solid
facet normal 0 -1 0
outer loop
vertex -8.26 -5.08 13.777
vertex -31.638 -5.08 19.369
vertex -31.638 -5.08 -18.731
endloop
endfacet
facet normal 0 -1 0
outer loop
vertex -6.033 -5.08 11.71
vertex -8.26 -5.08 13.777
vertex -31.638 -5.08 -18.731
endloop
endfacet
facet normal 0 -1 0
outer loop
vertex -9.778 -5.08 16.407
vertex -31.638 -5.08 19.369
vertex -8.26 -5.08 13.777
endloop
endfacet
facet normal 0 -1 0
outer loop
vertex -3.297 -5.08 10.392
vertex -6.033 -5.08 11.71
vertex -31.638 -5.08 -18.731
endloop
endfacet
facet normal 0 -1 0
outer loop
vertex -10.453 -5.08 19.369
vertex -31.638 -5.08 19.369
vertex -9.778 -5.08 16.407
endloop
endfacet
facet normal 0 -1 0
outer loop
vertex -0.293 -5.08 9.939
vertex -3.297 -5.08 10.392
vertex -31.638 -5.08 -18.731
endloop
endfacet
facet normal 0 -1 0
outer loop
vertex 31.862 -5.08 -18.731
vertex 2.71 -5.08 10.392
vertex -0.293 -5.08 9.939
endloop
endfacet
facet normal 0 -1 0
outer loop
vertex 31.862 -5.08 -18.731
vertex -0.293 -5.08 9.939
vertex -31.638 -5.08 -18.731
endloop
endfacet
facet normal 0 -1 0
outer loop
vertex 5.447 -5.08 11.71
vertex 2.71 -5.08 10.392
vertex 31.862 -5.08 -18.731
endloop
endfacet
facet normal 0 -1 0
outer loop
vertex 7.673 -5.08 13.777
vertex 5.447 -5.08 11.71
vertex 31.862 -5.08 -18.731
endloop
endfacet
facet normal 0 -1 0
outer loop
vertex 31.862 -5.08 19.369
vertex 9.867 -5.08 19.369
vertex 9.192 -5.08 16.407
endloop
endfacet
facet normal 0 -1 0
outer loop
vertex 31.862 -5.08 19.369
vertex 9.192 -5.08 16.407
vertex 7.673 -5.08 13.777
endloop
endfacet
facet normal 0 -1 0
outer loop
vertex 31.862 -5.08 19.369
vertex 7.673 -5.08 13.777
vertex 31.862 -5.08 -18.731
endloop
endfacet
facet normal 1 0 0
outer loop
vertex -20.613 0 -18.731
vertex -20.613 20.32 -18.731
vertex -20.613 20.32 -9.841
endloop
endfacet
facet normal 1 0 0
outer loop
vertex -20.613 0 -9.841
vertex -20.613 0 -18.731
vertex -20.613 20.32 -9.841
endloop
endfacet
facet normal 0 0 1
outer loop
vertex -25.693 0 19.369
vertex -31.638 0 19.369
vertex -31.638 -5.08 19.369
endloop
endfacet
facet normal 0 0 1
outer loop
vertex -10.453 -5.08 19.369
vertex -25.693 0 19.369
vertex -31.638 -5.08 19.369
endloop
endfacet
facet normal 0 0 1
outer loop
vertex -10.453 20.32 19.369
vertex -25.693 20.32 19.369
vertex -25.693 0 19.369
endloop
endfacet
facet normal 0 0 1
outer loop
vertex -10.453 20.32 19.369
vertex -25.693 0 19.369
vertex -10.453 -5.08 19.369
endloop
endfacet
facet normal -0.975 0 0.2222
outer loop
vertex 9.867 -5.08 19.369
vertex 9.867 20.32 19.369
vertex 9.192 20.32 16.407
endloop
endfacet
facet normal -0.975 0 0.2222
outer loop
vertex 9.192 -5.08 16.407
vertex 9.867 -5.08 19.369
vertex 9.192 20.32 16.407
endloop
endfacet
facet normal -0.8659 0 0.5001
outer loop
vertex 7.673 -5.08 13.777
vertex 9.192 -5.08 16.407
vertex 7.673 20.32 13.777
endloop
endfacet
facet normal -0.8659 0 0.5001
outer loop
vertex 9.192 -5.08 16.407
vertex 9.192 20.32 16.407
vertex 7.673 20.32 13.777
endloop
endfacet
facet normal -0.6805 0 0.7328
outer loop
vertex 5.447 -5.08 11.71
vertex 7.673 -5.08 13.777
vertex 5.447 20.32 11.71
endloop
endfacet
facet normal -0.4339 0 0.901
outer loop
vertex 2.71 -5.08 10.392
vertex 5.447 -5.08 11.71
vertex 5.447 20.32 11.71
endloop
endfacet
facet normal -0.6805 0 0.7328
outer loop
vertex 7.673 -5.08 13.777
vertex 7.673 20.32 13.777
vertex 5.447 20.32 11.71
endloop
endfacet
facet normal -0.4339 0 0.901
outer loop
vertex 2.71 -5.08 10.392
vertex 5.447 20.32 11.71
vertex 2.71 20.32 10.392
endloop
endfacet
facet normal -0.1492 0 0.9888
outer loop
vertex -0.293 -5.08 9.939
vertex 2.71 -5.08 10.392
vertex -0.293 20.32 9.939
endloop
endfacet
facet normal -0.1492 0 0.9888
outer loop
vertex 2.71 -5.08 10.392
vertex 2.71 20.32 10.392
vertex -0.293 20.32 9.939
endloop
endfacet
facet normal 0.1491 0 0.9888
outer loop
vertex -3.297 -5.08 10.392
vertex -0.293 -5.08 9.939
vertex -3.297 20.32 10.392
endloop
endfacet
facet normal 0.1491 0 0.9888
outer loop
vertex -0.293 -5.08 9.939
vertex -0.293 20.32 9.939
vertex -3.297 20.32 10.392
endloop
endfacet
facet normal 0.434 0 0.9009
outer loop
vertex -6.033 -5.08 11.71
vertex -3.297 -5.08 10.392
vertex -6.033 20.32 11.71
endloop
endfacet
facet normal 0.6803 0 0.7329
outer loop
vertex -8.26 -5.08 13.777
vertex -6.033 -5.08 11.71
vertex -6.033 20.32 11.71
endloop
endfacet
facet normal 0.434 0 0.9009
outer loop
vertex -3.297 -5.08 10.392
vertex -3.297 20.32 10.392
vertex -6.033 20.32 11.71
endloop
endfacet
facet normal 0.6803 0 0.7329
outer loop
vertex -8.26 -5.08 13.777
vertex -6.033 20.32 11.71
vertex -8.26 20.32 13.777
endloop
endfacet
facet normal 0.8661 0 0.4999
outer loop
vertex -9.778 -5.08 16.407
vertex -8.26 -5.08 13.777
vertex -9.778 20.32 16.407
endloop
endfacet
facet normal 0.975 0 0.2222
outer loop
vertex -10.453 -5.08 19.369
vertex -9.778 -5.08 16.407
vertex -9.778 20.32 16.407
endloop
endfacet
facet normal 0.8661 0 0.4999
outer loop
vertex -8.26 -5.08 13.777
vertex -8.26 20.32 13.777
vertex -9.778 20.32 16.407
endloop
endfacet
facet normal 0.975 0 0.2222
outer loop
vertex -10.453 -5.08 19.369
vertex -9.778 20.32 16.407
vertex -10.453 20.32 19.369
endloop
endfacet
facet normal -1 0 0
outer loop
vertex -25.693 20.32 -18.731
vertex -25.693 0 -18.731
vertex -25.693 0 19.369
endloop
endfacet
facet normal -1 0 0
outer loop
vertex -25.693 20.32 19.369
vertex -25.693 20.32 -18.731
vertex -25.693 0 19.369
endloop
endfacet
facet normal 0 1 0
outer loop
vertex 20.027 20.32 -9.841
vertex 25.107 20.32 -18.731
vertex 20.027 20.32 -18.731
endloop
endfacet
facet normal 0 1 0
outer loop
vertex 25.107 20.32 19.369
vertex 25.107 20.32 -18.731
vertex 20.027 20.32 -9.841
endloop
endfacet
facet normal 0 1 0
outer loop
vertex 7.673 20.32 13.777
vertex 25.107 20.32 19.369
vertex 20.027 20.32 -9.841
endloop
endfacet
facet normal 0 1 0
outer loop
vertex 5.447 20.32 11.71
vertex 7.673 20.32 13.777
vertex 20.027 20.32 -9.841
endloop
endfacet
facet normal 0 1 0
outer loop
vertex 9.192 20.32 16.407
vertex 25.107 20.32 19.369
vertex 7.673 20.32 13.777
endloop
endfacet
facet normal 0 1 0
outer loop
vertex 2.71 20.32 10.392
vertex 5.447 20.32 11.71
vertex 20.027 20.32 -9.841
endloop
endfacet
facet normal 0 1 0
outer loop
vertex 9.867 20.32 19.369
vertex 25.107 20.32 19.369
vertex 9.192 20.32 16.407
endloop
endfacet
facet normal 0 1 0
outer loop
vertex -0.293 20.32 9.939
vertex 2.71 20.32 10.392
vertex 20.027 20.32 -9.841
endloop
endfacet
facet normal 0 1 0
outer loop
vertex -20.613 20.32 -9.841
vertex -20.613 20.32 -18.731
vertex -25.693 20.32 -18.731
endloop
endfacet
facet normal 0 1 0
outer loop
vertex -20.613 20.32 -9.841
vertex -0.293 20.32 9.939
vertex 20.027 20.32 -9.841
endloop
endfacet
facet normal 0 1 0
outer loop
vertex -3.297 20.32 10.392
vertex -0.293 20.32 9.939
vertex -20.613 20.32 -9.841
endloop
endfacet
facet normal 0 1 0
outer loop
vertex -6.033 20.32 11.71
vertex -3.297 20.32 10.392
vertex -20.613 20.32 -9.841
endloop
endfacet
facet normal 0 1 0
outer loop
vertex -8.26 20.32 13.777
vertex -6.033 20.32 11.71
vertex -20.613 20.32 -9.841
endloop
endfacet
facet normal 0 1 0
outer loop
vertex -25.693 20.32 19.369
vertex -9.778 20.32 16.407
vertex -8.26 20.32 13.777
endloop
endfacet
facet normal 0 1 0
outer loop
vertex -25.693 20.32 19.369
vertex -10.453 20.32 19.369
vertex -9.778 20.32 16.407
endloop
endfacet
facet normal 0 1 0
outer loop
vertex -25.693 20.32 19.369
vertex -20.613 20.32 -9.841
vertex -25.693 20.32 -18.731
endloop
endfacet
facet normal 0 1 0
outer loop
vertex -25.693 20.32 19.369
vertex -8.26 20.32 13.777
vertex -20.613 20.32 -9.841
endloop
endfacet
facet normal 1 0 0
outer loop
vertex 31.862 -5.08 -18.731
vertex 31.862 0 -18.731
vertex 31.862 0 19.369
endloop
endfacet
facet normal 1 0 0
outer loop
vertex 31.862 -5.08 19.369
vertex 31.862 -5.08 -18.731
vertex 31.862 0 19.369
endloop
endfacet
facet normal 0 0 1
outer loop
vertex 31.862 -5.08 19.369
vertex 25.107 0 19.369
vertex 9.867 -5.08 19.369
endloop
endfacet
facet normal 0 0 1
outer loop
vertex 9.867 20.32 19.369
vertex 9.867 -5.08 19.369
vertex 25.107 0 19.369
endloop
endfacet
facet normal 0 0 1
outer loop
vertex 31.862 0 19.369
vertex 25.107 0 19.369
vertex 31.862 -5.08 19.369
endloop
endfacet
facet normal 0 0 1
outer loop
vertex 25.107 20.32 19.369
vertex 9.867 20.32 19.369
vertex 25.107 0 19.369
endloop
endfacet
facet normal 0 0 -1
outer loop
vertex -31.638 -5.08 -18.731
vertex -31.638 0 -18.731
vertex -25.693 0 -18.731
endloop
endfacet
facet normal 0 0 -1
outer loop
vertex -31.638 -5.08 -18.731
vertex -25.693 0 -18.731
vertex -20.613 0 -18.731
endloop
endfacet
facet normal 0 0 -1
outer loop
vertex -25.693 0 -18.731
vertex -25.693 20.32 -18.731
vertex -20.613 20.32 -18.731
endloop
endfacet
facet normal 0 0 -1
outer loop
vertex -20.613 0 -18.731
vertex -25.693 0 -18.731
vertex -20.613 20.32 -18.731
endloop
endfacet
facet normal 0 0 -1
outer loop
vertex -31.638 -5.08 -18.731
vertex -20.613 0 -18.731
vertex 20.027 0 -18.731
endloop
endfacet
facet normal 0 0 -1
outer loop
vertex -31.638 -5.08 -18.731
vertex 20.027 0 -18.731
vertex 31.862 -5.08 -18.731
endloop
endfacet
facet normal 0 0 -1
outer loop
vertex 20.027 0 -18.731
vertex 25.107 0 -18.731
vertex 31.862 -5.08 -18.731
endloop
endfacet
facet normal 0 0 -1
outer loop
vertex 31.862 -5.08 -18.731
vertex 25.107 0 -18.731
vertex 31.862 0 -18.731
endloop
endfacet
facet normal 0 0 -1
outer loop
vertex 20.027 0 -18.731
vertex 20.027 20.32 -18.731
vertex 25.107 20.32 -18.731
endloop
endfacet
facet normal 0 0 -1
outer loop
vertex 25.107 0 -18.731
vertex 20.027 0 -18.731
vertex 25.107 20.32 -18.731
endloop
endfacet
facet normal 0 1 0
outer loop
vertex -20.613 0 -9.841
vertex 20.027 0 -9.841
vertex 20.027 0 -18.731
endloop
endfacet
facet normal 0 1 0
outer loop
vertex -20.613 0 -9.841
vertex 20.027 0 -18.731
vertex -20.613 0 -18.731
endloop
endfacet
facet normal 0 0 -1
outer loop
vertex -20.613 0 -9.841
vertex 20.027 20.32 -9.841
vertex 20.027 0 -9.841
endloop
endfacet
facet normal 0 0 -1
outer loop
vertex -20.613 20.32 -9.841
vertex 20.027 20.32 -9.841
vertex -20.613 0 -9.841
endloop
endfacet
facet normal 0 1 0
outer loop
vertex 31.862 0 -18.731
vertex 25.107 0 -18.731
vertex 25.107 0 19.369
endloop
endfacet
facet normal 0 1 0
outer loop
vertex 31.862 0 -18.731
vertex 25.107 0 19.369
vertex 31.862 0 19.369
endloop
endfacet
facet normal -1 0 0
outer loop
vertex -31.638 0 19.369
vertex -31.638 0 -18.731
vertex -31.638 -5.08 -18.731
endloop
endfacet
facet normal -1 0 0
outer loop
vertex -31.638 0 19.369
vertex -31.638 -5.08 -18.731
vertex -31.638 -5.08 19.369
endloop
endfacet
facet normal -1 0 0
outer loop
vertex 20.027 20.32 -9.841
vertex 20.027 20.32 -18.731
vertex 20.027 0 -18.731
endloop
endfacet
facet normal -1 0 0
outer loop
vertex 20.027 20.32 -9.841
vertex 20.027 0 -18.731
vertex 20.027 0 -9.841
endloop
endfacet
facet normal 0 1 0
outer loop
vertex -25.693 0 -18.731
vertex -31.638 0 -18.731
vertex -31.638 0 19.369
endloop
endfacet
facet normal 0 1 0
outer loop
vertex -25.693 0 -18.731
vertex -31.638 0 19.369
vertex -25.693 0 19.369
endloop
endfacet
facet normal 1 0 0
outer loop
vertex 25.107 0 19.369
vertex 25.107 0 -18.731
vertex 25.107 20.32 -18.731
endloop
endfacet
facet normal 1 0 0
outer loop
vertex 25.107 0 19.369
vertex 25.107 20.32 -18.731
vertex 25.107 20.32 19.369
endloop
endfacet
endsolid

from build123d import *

# Parameters (mm, degrees)
F0_W     = 63.5
F0_H     = 38.1
F1_DEPTH = 5.08
F2_W     = 50.8
F2_H     = 38.1
F3_DEPTH = 20.32
F4_W     = 40.64
F4_H     = 8.89
F5_DEPTH = 20.32
F7_DEPTH = 50.8


with BuildPart() as f1:
    # F0 (on Front) → F1 (new body)
    with BuildSketch(Plane.XZ):
        with Locations((0.112484, 0.318908)):
            Rectangle(F0_W, F0_H)
    extrude(amount=F1_DEPTH)

    # F2 (on face) → F3 (join)
    with BuildSketch(Plane(origin=(0, 0, 0), x_dir=(-1, 0, 0), z_dir=(0, 1, 0))):
        with Locations((0.2931, 0.318908)):
            Rectangle(F2_W, F2_H)
    extrude(amount=F3_DEPTH)

    # F4 (on face) → F5 (cut)
    with BuildSketch(Plane(origin=(0, 20.32, 0), x_dir=(-1, 0, 0), z_dir=(0, 1, 0))):
        with Locations((0.2931, -14.286092)):
            Rectangle(F4_W, F4_H)
    extrude(amount=-F5_DEPTH, mode=Mode.SUBTRACT)

    # F6 (on face) → F7 (cut)
    with BuildSketch(Plane(origin=(0, 20.32, 0), x_dir=(-1, 0, 0), z_dir=(0, 1, 0))):
        with BuildLine():
            Line((10.4531, 19.368908), (-9.8669, 19.368908))
            ThreePointArc((-9.8669, 19.368908), (0.2931, 9.939267), (10.4531, 19.368908))
        make_face()
    extrude(amount=-F7_DEPTH, mode=Mode.SUBTRACT)


solid = f1.part
